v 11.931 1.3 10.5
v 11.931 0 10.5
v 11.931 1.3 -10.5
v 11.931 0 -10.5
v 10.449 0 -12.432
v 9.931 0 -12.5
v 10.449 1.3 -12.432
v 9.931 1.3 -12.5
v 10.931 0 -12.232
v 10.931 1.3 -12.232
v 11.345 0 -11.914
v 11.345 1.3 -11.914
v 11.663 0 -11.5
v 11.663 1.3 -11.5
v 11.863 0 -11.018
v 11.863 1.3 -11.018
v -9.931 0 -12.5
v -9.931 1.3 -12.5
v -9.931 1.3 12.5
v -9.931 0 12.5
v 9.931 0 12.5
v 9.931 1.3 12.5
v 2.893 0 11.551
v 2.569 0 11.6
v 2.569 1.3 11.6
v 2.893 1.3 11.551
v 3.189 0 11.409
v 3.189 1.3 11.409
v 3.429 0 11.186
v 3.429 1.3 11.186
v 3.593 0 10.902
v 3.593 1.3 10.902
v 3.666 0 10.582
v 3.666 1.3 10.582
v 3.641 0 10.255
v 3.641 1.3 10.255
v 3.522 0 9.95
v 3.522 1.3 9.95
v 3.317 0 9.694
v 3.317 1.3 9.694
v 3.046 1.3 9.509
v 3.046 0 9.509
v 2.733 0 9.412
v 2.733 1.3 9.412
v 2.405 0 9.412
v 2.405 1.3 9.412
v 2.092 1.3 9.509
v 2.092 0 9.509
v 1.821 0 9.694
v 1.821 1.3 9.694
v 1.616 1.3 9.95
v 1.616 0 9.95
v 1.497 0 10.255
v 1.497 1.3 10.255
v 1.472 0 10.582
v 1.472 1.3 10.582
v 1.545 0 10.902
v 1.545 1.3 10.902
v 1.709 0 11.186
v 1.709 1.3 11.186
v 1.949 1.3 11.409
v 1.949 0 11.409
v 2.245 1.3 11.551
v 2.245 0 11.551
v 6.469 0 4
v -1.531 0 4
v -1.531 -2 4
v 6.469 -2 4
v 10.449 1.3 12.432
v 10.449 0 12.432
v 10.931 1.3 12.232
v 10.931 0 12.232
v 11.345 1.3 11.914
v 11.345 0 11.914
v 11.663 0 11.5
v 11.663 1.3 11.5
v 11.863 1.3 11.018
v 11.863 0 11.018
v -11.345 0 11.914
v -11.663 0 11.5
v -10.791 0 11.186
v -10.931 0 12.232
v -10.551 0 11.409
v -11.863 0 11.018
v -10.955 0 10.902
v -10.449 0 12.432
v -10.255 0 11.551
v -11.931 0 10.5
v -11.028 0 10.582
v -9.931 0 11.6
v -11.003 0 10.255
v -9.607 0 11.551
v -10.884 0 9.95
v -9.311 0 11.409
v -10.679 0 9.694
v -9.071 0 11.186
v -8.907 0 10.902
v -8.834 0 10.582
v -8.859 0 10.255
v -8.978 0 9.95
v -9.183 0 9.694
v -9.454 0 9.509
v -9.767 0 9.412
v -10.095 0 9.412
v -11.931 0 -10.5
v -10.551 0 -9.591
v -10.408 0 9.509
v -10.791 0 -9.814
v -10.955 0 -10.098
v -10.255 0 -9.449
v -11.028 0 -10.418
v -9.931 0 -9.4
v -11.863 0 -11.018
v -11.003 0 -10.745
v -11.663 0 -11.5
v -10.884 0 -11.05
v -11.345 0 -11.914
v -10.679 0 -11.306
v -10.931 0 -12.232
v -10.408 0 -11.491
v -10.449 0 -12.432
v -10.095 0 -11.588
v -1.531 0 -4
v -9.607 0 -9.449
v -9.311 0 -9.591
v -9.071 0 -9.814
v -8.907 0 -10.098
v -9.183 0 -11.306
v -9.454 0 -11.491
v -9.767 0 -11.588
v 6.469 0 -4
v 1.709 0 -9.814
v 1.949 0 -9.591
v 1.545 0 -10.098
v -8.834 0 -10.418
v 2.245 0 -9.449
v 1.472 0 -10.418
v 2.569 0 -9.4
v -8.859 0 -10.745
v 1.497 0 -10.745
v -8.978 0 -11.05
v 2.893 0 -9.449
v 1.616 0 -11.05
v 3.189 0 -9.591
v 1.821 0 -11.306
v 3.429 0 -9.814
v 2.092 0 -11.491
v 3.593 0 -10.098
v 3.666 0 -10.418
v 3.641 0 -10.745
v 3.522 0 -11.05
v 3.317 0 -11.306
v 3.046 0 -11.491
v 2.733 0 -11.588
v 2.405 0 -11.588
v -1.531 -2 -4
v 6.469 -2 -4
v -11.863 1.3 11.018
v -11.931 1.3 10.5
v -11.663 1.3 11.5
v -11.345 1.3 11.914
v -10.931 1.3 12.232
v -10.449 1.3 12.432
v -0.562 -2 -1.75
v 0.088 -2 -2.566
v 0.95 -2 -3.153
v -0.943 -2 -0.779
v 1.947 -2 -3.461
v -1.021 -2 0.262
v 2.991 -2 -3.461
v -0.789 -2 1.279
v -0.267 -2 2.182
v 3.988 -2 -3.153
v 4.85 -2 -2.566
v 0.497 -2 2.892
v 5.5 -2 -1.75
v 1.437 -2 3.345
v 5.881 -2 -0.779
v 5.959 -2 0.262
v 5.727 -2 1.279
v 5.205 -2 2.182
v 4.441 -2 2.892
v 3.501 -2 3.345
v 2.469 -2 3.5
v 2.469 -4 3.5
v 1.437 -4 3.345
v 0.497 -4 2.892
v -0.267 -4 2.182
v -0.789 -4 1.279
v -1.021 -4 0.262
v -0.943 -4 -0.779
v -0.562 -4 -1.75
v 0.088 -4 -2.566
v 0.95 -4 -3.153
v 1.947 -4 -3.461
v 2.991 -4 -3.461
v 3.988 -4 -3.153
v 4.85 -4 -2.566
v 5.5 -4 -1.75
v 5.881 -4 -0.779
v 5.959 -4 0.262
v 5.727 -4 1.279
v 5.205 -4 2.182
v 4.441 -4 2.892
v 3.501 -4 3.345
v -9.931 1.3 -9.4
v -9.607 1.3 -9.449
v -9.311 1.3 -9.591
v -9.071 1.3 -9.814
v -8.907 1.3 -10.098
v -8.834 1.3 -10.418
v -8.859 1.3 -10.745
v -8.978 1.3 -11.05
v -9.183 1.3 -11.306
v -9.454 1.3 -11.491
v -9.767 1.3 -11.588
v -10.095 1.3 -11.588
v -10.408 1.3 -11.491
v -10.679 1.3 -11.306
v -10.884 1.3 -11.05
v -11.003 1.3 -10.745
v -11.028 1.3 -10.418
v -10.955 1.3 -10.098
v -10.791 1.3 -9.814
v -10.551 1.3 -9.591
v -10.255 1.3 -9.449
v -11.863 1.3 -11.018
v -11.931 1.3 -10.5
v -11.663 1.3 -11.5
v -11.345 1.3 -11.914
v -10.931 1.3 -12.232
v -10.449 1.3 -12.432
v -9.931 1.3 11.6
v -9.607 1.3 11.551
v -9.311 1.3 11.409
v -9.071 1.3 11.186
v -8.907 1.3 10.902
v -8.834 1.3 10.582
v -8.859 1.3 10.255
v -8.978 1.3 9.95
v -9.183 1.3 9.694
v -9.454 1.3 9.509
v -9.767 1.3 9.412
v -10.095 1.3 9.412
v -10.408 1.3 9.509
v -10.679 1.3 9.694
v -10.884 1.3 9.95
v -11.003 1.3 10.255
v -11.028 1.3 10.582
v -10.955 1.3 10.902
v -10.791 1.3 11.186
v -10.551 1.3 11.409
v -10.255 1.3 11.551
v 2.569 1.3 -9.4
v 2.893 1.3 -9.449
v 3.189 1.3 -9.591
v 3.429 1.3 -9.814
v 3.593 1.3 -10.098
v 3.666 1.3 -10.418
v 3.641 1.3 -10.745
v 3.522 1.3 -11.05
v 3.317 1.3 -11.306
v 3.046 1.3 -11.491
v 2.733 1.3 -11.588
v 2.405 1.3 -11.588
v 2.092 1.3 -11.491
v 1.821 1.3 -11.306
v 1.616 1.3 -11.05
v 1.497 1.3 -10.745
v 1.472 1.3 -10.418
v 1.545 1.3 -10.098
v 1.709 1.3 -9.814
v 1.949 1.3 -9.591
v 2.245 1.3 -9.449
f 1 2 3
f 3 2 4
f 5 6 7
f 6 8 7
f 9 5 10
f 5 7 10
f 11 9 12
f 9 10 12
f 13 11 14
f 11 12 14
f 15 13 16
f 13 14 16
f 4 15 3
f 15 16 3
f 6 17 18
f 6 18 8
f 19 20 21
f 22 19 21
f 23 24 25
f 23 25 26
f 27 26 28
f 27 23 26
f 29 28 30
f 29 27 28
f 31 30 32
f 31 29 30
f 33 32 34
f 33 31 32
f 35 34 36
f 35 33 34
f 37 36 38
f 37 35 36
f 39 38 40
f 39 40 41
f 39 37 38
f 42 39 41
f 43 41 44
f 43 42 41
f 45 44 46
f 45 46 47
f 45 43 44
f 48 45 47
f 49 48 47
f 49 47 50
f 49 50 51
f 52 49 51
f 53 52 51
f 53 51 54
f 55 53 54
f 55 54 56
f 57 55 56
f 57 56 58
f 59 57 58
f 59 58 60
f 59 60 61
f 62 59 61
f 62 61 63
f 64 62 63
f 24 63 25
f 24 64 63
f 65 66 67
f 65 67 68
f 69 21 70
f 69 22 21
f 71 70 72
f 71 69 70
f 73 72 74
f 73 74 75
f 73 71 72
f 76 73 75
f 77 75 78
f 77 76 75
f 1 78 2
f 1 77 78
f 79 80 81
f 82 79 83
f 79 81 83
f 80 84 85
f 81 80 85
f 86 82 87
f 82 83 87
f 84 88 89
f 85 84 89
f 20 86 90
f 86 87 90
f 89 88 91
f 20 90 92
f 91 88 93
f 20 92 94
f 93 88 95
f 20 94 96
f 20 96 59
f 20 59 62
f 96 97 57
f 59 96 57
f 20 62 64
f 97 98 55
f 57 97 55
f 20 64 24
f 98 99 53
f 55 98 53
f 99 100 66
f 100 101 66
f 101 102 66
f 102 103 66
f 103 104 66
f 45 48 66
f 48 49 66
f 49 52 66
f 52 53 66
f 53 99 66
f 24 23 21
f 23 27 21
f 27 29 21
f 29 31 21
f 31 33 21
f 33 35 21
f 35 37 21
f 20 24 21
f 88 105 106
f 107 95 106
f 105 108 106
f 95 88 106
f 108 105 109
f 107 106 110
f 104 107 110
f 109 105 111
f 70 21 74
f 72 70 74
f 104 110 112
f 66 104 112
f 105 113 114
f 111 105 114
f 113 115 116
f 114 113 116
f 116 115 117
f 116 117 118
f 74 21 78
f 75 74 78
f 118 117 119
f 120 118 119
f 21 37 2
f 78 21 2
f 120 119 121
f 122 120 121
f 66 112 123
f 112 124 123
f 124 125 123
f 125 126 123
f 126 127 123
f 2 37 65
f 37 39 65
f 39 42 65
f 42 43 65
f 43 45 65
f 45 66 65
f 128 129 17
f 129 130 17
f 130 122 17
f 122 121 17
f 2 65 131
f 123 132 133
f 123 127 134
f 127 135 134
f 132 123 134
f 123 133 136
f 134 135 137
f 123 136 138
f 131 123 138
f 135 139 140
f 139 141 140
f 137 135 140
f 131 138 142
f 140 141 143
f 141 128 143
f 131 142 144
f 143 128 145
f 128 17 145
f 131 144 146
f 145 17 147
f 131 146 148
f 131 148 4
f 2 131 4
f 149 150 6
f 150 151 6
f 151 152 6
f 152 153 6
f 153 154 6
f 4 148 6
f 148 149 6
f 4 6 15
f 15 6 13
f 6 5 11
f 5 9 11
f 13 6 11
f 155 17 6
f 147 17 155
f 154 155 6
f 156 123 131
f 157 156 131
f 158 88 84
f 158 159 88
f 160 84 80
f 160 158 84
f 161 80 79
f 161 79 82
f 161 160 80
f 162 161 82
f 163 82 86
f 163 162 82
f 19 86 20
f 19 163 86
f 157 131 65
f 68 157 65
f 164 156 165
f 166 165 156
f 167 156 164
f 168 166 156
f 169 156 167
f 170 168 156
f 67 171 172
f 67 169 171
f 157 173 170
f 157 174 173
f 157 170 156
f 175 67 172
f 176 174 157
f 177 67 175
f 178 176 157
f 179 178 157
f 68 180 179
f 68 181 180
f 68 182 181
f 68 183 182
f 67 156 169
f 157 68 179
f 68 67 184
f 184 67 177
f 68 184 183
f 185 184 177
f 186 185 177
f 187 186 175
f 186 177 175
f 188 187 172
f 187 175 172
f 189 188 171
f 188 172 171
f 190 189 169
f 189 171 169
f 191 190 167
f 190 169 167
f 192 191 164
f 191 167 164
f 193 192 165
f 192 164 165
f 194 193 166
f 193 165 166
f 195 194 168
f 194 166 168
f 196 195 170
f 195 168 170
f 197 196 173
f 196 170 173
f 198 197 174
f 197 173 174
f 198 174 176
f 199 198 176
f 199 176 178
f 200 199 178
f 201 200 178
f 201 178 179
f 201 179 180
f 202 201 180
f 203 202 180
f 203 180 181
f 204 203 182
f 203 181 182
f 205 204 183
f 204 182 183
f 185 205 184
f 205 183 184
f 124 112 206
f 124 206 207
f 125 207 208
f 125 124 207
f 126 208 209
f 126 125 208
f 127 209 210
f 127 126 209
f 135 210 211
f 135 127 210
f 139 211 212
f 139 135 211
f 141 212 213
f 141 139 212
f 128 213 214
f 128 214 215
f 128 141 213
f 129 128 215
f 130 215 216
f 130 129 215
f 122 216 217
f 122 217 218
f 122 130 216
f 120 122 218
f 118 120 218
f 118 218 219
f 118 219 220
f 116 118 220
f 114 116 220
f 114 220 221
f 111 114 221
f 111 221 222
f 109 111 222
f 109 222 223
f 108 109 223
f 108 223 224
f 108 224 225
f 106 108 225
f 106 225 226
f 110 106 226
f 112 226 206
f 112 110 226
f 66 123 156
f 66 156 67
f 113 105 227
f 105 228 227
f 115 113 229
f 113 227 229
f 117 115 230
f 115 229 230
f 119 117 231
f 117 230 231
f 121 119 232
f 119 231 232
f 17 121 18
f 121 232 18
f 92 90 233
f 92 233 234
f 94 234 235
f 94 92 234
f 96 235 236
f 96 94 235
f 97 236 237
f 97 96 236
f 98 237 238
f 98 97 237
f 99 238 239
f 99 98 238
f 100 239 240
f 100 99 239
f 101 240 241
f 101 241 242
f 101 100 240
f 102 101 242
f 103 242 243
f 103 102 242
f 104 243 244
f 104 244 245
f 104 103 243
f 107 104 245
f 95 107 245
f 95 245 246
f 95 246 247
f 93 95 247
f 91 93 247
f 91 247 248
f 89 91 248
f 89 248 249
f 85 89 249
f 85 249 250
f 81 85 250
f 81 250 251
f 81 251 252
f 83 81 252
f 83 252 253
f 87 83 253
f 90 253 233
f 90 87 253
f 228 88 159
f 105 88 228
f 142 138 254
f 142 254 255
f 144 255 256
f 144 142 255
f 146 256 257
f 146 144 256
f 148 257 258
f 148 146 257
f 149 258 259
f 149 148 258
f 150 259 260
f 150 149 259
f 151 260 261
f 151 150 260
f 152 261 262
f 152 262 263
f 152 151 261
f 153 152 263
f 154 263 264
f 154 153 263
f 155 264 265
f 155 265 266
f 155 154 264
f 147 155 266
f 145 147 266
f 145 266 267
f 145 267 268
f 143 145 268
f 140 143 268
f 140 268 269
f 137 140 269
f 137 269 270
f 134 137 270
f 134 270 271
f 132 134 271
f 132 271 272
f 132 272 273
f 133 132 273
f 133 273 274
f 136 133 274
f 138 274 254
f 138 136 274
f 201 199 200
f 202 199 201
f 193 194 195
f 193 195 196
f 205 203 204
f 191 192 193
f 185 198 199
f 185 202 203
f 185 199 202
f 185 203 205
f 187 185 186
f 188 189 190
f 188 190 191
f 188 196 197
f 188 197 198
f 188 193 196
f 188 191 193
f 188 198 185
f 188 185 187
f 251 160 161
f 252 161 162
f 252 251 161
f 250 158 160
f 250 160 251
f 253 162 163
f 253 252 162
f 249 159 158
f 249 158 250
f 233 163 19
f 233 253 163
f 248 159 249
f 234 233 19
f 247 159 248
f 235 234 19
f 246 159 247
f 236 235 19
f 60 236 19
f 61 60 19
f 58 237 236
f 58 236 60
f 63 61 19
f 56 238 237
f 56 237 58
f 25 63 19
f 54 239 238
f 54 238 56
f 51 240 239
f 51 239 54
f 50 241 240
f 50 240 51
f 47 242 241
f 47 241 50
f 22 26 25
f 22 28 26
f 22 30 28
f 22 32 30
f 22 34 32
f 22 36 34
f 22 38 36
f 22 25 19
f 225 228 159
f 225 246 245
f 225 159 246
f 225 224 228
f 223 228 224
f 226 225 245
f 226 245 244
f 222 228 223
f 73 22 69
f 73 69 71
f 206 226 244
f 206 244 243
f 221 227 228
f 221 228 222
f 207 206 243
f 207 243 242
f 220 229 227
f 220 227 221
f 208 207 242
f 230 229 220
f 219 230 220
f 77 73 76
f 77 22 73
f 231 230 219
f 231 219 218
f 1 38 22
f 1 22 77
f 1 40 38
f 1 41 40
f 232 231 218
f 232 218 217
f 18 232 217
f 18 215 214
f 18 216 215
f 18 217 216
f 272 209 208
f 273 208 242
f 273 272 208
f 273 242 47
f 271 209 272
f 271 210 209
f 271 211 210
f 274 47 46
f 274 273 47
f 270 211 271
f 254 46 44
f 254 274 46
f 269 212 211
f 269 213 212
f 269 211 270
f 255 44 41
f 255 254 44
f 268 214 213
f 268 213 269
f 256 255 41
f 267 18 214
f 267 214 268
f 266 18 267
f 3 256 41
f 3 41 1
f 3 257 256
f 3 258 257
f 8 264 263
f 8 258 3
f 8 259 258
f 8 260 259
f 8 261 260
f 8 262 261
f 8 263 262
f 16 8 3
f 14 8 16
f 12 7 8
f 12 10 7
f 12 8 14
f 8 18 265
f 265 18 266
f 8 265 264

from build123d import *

# Parameters (mm, degrees)
SKETCH1_W           = 23.862
SKETCH1_H           = 25
SKETCH1_R           = 1.1
BOSS_EXTRUDE1_DEPTH = 1.3
SKETCH2_W           = 8
SKETCH2_H           = 8
BOSS_EXTRUDE2_DEPTH = 2
SKETCH3_R           = 3.5
BOSS_EXTRUDE3_DEPTH = 2
FILLET1_R           = 2


with BuildPart() as part:
    # Sketch1 → Boss-Extrude1 (new body)
    with BuildSketch(Plane(origin=(0, 0, 0), x_dir=(1, 0, 0), z_dir=(0, 1, 0))):
        Rectangle(SKETCH1_W, SKETCH1_H)
        with Locations(Location((-9.931, -10.5, 0), (0, 0, 270))):
            Circle(SKETCH1_R, mode=Mode.SUBTRACT)
        with Locations(Location((2.569, -10.5, 0), (0, 0, 270))):
            Circle(SKETCH1_R, mode=Mode.SUBTRACT)
        with Locations(Location((-9.931, 10.5, 0), (0, 0, 270))):
            Circle(SKETCH1_R, mode=Mode.SUBTRACT)
        with Locations(Location((2.569, 10.5, 0), (0, 0, 270))):
            Circle(SKETCH1_R, mode=Mode.SUBTRACT)
    extrude(amount=BOSS_EXTRUDE1_DEPTH)

    # Sketch2 → Boss-Extrude2 (add)
    with BuildSketch(Plane.XZ):
        with Locations((2.469, 0)):
            Rectangle(SKETCH2_W, SKETCH2_H)
    extrude(amount=BOSS_EXTRUDE2_DEPTH)

    # Sketch3 → Boss-Extrude3 (add)
    with BuildSketch(Plane.XZ.offset(2)):
        with Locations(Location((2.469, 0, 0), (0, 0, 90))):
            Circle(SKETCH3_R)
    extrude(amount=BOSS_EXTRUDE3_DEPTH)

    # Fillet1
    fillet1_edges = [part.edges().sort_by_distance(p)[0] for p in [
        (11.931, 0.65, 12.5),
        (-11.931, 0.65, 12.5),
        (-11.931, 0.65, -12.5),
        (11.931, 0.65, -12.5),
    ]]
    fillet(fillet1_edges, radius=FILLET1_R)


solid = part.part
